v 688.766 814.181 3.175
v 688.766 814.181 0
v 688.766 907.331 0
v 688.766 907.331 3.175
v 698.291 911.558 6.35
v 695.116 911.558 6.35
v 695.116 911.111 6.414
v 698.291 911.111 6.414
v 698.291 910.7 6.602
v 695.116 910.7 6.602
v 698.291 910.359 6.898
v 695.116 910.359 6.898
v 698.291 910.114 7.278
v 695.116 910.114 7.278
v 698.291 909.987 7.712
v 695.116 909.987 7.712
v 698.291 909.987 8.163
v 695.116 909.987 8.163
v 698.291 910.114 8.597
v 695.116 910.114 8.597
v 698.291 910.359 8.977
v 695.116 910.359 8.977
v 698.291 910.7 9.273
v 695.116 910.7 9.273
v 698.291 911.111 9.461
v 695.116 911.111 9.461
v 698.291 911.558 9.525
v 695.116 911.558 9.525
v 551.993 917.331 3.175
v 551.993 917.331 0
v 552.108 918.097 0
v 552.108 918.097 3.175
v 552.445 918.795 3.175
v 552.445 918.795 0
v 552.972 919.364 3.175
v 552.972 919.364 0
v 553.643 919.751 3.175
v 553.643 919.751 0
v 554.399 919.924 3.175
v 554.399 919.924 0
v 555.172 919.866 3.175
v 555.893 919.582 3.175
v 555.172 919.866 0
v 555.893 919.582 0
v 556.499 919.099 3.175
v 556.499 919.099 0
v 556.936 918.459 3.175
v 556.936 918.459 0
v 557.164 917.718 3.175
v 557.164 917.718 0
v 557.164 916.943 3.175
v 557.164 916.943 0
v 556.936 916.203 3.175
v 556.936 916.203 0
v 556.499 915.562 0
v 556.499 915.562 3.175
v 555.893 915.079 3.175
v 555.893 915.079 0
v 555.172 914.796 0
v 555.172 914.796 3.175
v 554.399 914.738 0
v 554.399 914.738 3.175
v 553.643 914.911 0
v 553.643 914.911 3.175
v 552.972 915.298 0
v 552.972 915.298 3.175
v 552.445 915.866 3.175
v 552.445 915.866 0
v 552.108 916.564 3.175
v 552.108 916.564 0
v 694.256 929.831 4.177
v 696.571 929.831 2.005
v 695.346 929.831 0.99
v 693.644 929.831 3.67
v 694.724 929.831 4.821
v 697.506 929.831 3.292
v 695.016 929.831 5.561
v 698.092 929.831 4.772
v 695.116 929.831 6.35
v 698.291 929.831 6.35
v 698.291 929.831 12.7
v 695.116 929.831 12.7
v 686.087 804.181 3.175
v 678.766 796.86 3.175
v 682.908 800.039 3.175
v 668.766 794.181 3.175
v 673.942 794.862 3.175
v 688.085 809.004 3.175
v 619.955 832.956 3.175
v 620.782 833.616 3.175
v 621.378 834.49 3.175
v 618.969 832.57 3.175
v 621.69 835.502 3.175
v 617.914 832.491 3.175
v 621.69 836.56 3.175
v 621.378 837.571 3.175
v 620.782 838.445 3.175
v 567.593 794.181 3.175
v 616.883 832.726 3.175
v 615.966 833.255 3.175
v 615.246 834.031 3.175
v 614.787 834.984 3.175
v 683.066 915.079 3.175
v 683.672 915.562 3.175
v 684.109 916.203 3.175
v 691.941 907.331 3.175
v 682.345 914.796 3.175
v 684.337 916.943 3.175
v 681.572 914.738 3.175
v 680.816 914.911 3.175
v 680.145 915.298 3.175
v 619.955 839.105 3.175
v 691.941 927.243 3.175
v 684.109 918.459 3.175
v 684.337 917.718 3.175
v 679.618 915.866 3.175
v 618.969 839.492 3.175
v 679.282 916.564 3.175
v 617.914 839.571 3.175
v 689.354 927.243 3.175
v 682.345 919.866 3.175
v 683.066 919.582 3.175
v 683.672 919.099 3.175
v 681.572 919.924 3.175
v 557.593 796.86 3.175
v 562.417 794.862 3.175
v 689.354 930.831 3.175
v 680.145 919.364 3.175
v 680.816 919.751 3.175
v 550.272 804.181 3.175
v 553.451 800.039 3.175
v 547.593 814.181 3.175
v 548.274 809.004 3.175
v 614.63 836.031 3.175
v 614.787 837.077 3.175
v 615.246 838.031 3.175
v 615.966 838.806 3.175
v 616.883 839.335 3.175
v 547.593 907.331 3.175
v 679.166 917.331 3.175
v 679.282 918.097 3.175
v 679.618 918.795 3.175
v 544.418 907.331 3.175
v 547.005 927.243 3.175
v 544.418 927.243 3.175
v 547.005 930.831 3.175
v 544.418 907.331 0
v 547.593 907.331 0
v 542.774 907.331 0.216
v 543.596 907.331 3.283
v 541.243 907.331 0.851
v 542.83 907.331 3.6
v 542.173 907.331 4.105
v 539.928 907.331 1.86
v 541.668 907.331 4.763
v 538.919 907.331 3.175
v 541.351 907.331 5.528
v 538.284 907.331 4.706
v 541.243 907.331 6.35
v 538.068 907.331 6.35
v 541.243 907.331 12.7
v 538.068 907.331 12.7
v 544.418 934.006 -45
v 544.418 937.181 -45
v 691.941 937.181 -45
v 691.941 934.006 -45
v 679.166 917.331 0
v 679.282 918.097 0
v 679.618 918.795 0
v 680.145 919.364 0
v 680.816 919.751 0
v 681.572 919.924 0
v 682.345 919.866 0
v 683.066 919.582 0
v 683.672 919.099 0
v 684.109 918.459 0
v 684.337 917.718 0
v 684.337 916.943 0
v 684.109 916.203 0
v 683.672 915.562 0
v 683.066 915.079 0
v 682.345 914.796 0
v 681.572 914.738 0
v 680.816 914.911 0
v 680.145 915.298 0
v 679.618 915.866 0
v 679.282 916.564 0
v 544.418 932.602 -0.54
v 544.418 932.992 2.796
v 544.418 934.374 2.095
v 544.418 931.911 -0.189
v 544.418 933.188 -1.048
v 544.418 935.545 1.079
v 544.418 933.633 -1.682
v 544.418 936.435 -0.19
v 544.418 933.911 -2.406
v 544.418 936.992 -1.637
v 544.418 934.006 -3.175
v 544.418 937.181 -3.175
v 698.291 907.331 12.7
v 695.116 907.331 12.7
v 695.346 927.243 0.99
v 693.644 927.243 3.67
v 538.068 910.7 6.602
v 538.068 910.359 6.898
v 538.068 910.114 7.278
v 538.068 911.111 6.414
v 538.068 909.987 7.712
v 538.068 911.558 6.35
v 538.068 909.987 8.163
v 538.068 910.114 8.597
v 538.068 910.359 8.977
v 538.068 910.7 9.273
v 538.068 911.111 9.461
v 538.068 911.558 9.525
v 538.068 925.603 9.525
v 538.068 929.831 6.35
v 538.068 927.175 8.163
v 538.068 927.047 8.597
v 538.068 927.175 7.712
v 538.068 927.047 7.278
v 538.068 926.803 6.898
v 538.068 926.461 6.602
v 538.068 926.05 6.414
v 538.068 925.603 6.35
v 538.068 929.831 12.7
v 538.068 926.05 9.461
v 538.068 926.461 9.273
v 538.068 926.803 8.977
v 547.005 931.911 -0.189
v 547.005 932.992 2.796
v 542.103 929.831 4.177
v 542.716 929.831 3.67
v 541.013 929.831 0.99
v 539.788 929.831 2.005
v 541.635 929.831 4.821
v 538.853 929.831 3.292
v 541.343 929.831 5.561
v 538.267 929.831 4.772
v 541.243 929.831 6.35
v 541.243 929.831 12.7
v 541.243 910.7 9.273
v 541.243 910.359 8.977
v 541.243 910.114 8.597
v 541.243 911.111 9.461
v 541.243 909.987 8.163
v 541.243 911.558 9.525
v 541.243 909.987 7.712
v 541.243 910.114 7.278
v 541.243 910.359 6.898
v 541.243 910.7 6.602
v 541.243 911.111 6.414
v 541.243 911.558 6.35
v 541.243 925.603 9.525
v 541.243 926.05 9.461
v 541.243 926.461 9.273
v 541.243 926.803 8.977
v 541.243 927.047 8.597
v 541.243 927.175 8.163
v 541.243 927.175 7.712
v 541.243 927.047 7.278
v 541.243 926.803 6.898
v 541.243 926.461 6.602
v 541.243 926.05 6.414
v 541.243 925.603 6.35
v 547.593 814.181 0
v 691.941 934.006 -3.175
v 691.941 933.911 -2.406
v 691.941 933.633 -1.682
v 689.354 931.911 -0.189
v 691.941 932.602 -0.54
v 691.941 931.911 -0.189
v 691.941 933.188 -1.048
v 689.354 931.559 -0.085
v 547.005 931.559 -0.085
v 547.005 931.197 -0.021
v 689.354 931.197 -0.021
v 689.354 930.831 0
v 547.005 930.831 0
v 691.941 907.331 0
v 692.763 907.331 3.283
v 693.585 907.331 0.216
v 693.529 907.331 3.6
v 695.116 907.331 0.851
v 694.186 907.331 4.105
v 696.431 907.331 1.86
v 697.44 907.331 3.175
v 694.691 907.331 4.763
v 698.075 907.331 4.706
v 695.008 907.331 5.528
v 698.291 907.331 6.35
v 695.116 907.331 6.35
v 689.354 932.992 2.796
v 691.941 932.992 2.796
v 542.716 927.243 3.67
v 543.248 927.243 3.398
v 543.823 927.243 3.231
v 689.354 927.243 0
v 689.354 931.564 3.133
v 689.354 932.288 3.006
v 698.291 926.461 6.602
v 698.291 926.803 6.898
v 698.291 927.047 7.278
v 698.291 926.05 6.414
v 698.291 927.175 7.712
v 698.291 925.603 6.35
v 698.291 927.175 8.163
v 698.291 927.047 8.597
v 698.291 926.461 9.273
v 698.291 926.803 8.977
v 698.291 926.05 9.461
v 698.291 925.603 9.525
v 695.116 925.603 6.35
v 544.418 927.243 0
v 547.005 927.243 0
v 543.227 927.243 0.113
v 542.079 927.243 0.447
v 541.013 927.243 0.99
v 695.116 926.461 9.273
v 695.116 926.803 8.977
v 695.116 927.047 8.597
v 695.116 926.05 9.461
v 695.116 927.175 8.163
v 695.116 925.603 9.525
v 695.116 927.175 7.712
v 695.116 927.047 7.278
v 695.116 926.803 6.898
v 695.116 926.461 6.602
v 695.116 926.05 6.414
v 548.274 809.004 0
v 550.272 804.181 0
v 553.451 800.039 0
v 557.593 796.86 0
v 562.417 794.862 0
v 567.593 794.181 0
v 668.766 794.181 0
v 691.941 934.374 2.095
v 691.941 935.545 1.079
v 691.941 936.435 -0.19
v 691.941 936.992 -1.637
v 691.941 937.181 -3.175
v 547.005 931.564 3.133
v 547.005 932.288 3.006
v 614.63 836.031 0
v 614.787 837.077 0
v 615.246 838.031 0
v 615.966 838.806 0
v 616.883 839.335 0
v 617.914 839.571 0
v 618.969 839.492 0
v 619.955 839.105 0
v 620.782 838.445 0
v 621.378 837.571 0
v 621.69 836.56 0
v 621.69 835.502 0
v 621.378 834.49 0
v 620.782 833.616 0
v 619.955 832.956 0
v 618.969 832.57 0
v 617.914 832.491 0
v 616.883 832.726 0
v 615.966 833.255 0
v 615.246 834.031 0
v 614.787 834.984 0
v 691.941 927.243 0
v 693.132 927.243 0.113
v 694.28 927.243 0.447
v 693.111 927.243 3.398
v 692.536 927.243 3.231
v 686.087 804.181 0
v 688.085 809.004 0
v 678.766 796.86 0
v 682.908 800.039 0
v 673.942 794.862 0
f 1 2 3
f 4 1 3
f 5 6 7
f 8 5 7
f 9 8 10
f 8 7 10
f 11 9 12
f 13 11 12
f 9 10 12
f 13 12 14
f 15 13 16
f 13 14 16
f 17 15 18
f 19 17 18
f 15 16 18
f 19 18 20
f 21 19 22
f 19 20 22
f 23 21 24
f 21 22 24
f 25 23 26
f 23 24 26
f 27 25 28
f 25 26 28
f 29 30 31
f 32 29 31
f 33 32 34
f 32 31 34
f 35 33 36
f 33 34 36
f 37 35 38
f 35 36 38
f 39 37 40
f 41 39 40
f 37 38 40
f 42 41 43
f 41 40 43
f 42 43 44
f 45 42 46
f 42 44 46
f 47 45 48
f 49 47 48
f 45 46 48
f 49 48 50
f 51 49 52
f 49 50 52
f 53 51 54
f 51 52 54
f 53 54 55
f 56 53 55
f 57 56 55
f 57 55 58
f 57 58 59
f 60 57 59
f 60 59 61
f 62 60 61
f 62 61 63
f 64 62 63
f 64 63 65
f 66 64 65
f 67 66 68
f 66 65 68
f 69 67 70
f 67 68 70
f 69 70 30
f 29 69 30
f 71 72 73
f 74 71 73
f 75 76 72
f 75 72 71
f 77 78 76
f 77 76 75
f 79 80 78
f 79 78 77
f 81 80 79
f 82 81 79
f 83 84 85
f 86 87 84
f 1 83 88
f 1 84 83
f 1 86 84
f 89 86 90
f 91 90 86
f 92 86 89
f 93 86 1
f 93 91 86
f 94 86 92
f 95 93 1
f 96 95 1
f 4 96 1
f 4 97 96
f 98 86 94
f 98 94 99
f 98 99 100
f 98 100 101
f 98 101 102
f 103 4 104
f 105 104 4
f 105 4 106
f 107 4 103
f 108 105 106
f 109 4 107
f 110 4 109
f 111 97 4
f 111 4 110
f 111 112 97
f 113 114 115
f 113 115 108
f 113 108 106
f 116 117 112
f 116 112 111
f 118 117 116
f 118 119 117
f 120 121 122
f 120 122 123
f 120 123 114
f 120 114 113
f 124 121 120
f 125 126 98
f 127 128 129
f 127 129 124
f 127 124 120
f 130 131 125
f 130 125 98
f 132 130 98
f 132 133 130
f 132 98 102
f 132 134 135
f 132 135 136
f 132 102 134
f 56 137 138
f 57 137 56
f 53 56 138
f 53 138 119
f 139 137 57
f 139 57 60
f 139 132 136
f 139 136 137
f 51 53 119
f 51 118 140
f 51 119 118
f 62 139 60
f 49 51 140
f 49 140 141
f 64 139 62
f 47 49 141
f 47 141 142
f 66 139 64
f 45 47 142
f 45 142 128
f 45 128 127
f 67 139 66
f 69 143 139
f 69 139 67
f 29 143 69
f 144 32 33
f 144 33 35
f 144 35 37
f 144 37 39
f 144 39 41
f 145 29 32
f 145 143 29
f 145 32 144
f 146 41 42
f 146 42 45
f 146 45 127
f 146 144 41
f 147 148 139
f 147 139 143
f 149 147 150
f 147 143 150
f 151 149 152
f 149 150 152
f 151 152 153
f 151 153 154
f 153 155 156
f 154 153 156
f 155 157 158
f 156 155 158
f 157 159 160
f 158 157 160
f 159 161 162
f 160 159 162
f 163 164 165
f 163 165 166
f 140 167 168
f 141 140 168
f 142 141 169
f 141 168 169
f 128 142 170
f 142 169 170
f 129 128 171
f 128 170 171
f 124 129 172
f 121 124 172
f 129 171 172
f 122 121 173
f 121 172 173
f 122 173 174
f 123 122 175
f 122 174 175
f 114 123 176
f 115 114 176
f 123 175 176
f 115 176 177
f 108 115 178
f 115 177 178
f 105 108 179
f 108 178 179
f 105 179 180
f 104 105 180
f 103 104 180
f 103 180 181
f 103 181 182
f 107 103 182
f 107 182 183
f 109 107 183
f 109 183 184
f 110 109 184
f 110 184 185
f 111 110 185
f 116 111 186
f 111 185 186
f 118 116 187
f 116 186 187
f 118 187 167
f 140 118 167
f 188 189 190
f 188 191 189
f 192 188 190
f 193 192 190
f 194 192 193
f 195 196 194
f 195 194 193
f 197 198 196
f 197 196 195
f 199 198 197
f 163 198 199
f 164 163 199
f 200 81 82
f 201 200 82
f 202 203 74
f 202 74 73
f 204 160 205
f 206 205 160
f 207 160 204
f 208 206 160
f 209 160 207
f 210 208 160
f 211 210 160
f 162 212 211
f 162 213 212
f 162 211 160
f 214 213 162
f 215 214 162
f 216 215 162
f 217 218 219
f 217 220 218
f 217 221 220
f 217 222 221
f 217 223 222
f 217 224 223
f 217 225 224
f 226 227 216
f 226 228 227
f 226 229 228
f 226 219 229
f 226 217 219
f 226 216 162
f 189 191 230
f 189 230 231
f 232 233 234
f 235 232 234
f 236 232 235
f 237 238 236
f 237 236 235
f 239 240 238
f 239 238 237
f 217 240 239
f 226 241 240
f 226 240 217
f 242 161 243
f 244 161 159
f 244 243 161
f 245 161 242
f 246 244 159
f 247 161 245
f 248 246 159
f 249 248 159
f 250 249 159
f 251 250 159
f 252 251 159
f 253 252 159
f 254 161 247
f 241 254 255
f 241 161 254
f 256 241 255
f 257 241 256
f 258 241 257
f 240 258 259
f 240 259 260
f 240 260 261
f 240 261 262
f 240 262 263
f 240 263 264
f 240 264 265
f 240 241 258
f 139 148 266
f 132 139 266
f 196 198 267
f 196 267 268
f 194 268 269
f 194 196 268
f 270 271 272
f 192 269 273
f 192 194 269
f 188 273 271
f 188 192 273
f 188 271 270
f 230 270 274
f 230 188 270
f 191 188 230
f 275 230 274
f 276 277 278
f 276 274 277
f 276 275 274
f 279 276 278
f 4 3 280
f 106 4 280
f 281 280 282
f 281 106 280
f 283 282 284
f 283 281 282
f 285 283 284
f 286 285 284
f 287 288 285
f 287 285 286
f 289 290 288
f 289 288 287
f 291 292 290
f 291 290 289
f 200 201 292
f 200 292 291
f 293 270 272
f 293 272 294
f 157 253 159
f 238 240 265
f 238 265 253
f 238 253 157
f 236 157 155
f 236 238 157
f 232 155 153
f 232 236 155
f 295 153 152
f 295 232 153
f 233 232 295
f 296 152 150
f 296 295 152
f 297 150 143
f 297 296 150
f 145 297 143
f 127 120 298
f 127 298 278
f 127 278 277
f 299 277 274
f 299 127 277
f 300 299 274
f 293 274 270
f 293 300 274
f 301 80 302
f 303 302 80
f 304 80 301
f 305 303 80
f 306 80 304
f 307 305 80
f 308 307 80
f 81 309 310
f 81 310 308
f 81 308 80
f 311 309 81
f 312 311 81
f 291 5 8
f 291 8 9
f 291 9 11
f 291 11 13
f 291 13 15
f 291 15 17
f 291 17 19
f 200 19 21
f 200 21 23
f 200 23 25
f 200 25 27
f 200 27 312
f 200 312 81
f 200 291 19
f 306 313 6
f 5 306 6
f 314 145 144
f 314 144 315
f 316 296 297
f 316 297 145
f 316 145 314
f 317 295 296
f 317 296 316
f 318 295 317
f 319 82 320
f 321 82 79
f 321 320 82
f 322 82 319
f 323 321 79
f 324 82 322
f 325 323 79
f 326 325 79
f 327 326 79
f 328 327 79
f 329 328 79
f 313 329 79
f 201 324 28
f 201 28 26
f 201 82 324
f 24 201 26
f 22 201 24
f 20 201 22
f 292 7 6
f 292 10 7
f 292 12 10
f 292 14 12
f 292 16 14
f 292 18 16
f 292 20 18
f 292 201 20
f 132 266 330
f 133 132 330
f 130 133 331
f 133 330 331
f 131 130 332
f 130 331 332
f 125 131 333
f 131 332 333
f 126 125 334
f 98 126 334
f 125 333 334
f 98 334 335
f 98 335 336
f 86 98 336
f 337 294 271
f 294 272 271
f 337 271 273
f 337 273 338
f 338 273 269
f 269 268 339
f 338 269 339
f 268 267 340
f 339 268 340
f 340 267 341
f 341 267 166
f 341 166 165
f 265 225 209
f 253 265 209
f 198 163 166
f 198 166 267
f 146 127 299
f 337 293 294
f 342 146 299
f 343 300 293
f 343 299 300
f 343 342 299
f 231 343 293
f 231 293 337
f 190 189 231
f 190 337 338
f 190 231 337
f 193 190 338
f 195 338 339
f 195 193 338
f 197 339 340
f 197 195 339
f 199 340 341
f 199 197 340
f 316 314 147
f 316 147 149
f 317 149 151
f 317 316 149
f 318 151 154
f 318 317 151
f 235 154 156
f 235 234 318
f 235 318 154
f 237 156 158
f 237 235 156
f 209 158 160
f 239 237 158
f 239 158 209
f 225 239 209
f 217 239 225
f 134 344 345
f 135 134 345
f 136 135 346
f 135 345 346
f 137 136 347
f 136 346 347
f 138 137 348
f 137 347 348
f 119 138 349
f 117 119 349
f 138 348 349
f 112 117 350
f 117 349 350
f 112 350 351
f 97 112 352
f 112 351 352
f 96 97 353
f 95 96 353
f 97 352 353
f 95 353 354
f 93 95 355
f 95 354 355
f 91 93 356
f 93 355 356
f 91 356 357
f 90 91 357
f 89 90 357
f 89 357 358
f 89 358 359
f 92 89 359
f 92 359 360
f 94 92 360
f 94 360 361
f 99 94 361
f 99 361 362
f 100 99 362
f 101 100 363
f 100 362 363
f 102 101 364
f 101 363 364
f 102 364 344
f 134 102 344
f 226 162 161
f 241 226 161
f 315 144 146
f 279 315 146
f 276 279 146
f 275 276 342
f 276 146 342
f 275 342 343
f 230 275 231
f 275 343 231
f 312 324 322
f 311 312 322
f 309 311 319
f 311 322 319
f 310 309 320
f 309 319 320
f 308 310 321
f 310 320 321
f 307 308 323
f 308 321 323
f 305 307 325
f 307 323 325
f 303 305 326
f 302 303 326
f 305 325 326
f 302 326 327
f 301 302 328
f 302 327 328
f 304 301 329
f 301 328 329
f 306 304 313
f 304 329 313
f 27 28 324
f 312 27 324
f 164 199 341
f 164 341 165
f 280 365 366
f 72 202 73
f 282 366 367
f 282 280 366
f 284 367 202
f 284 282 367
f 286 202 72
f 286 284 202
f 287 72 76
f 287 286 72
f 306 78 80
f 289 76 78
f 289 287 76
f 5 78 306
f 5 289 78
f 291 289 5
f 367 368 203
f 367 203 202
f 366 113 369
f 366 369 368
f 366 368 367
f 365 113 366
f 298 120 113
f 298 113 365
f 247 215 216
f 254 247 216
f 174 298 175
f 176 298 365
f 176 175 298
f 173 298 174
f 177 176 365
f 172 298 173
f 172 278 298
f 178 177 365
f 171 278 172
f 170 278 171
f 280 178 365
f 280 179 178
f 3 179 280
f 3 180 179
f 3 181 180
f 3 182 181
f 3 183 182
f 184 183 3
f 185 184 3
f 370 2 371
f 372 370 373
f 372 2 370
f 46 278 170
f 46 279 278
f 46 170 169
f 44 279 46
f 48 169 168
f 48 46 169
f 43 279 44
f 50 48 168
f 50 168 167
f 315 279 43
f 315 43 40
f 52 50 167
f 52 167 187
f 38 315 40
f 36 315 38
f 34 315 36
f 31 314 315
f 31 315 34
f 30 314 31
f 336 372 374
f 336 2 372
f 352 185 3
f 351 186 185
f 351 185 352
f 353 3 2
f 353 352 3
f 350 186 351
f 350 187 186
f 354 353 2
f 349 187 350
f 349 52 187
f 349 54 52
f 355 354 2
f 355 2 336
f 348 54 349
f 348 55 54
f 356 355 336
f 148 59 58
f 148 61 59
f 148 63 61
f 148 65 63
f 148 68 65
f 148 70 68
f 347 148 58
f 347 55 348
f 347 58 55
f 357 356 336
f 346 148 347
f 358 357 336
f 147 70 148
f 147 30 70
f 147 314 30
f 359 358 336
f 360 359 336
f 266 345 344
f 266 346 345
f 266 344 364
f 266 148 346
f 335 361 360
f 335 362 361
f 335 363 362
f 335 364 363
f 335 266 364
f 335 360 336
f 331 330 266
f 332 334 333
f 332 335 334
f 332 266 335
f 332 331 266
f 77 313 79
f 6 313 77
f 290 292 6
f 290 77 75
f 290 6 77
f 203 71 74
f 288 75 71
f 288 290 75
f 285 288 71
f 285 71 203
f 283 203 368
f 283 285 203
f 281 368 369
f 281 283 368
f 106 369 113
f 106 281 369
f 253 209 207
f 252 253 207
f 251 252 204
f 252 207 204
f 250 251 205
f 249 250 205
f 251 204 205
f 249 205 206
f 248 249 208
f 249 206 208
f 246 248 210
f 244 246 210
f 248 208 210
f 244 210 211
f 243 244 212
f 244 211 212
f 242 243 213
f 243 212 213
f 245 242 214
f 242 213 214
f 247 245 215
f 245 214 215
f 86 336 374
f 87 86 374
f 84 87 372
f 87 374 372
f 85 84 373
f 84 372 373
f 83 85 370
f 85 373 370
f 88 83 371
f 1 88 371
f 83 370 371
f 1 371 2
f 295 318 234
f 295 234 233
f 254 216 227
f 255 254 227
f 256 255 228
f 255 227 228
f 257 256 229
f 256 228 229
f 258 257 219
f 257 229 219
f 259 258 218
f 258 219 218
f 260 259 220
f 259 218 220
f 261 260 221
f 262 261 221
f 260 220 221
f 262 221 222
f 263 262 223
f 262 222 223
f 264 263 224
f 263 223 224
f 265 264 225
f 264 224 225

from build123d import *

# Parameters (mm, degrees)
SKETCH13_R              = 2.6
SKETCH13_R_2            = 3.55
BASE_FLANGE1_DEPTH      = 3.175
EDGE_FLANGE2_DEPTH      = 22.5
EDGE_FLANGE3_DEPTH      = 22.5
CUT_EXTRUDE3_DEPTH      = 944.619626468
CUT_EXTRUDE3_DEPTH_BACK = 944.619626468
EDGE_FLANGE4_DEPTH      = 147.523066449
CORNER_START            = 927.243279461
CORNER_RELIEF2_DEPTH    = 2.5875
CORNER_START_2          = 544.417983929
CORNER_RELIEF2_2_DEPTH  = 2.5875
CORNER_RELIEF3_DEPTH    = 2.5875
CORNER_START_3          = 689.353550378
CORNER_RELIEF3_2_DEPTH  = 2.5875


with BuildPart() as part:
    # Base-Flange1: sheet metal written as solids
    # Sketch13 → Base-Flange1 (new body)
    with BuildSketch(Plane(origin=(0, 0, 0), x_dir=(-1, 0, 0), z_dir=(0, 0, -1))):
        with BuildLine():
            Line((-547.592983929, 907.330779461), (-547.592983929, 814.180779461))
            ThreePointArc((-547.592983929, 814.180779461), (-553.450848305, 800.038643837), (-567.592983929, 794.180779461))
            Line((-567.592983929, 794.180779461), (-668.766050378, 794.180779461))
            ThreePointArc((-668.766050378, 794.180779461), (-682.908186002, 800.038643837), (-688.766050378, 814.180779461))
            Line((-688.766050378, 814.180779461), (-688.766050378, 907.330779461))
            Line((-688.766050378, 907.330779461), (-691.941050378, 907.330779461))
            Line((-691.941050378, 907.330779461), (-691.941050378, 929.830779461))
            Line((-691.941050378, 929.830779461), (-544.417983929, 929.830779461))
            Line((-544.417983929, 929.830779461), (-544.417983929, 907.330779461))
            Line((-544.417983929, 907.330779461), (-547.592983929, 907.330779461))
        make_face()
        with Locations((-681.766050378, 917.330779461)):
            Circle(SKETCH13_R, mode=Mode.SUBTRACT)
        with Locations((-618.179517153, 836.030779461)):
            Circle(SKETCH13_R_2, mode=Mode.SUBTRACT)
        with Locations((-554.592983929, 917.330779461)):
            Circle(SKETCH13_R, mode=Mode.SUBTRACT)
    extrude(amount=-BASE_FLANGE1_DEPTH)

    # Edge-Flange2: sheet metal written as solids
    # Edge-Flange2 section (on a plane across the edge) → Edge-Flange2 (add)
    with BuildSketch(Plane(origin=(695.116050378, 907.330779461, 3.175), x_dir=(-1, 0, 0), z_dir=(0, 1, 0))):
        with BuildLine():
            Line((-3.175, 3.175), (-3.175, 9.525))
            Line((-3.175, 9.525), (0, 9.525))
            Line((0, 9.525), (0, 3.175))
            ThreePointArc((0, 3.175), (0.92993597, 0.92993597), (3.175, 0))
            Line((3.175, 0), (3.175, -3.175))
            ThreePointArc((3.175, -3.175), (-1.315128061, -1.315128061), (-3.175, 3.175))
        make_face()
    extrude(amount=EDGE_FLANGE2_DEPTH)

    # Edge-Flange3: sheet metal written as solids
    # Edge-Flange3 section (on a plane across the edge) → Edge-Flange3 (add)
    with BuildSketch(Plane(origin=(541.242983929, 929.830779461, 3.175), x_dir=(1, 0, 0), z_dir=(0, -1, 0))):
        with BuildLine():
            Line((-3.175, 3.175), (-3.175, 9.525))
            Line((-3.175, 9.525), (0, 9.525))
            Line((0, 9.525), (0, 3.175))
            ThreePointArc((0, 3.175), (0.92993597, 0.92993597), (3.175, 0))
            Line((3.175, 0), (3.175, -3.175))
            ThreePointArc((3.175, -3.175), (-1.315128061, -1.315128061), (-3.175, 3.175))
        make_face()
    extrude(amount=EDGE_FLANGE3_DEPTH)

    # Sketch27 → Cut-Extrude3 (cut, two sides: drawn at the far end of the back side and taken through both)
    with BuildSketch(Plane(origin=(698.291050378, 0, 0), x_dir=(0, 0, -1), z_dir=(1, 0, 0)).offset(-CUT_EXTRUDE3_DEPTH_BACK)):
        with BuildLine():
            Line((-9.525, 911.558356296), (-9.525, 925.603202625))
            ThreePointArc((-9.525, 925.603202625), (-7.9375, 927.190702625), (-6.35, 925.603202625))
            Line((-6.35, 925.603202625), (-6.35, 911.558356296))
            ThreePointArc((-6.35, 911.558356296), (-7.9375, 909.970856296), (-9.525, 911.558356296))
        make_face()
    extrude(amount=CUT_EXTRUDE3_DEPTH + CUT_EXTRUDE3_DEPTH_BACK, mode=Mode.SUBTRACT)

    # Edge-Flange4: sheet metal written as solids
    # Edge-Flange4 section (on a plane across the edge) → Edge-Flange4 (add)
    with BuildSketch(Plane(origin=(544.417983929, 934.005779461, 0), x_dir=(0, -1, 0), z_dir=(1, 0, 0))):
        with BuildLine():
            Line((-3.175, 3.175), (-3.175, 45))
            Line((-3.175, 45), (0, 45))
            Line((0, 45), (0, 3.175))
            ThreePointArc((0, 3.175), (0.92993597, 0.92993597), (3.175, 0))
            Line((3.175, 0), (4.175, 0))
            Line((4.175, 0), (4.175, -3.175))
            Line((4.175, -3.175), (3.175, -3.175))
            ThreePointArc((3.175, -3.175), (-1.315128061, -1.315128061), (-3.175, 3.175))
        make_face()
    extrude(amount=EDGE_FLANGE4_DEPTH)

    # Corner Relief2: read off the stored shape, not the designer's step
    # Corner Relief2 outline → Corner Relief2 (cut)
    with BuildSketch(Plane(origin=(0, 0, 0), x_dir=(1, 0, 0), z_dir=(0, 1, 0)).offset(CORNER_START)):
        with BuildLine():
            Line((541.013027484, -0.990077276), (542.715505707, -3.670038638))
            ThreePointArc((542.715505707, -3.670038638), (543.531488674, -3.301270566), (544.417983929, -3.175))
            Line((544.417983929, -3.175), (544.417983929, 0))
            ThreePointArc((544.417983929, 0), (542.644993418, -0.252541132), (541.013027484, -0.990077276))
        make_face()
    extrude(amount=CORNER_RELIEF2_DEPTH, mode=Mode.SUBTRACT)

    # Corner Relief2 2 outline → Corner Relief2 2 (cut)
    with BuildSketch(Plane.YZ.offset(CORNER_START_2)):
        with BuildLine():
            Line((930.830779461, 3.175), (927.243279461, 3.175))
            Line((927.243279461, 3.175), (927.243279461, 0))
            Line((927.243279461, 0), (930.830779461, 0))
            ThreePointArc((930.830779461, 0), (931.379229895, -0.047728486), (931.911191064, -0.189478979))
            Line((931.911191064, -0.189478979), (932.991602668, 2.796042042))
            ThreePointArc((932.991602668, 2.796042042), (931.92768033, 3.079543028), (930.830779461, 3.175))
        make_face()
    extrude(amount=CORNER_RELIEF2_2_DEPTH, mode=Mode.SUBTRACT)

    # Corner Relief3: read off the stored shape, not the designer's step
    # Corner Relief3 outline → Corner Relief3 (cut)
    with BuildSketch(Plane(origin=(0, 0, 0), x_dir=(1, 0, 0), z_dir=(0, 1, 0)).offset(CORNER_START)):
        with BuildLine():
            ThreePointArc((691.941050378, -3.175), (692.827545633, -3.301270566), (693.6435286, -3.670038638))
            Line((693.6435286, -3.670038638), (695.346006823, -0.990077276))
            ThreePointArc((695.346006823, -0.990077276), (693.714040889, -0.252541132), (691.941050378, 0))
            Line((691.941050378, 0), (691.941050378, -3.175))
        make_face()
    extrude(amount=CORNER_RELIEF3_DEPTH, mode=Mode.SUBTRACT)

    # Corner Relief3 2 outline → Corner Relief3 2 (cut)
    with BuildSketch(Plane.YZ.offset(CORNER_START_3)):
        with BuildLine():
            Line((930.830779461, 3.175), (927.243279461, 3.175))
            Line((927.243279461, 3.175), (927.243279461, 0))
            Line((927.243279461, 0), (930.830779461, 0))
            ThreePointArc((930.830779461, 0), (931.379229895, -0.047728486), (931.911191064, -0.189478979))
            Line((931.911191064, -0.189478979), (932.991602668, 2.796042042))
            ThreePointArc((932.991602668, 2.796042042), (931.92768033, 3.079543028), (930.830779461, 3.175))
        make_face()
    extrude(amount=CORNER_RELIEF3_2_DEPTH, mode=Mode.SUBTRACT)


solid = part.part
